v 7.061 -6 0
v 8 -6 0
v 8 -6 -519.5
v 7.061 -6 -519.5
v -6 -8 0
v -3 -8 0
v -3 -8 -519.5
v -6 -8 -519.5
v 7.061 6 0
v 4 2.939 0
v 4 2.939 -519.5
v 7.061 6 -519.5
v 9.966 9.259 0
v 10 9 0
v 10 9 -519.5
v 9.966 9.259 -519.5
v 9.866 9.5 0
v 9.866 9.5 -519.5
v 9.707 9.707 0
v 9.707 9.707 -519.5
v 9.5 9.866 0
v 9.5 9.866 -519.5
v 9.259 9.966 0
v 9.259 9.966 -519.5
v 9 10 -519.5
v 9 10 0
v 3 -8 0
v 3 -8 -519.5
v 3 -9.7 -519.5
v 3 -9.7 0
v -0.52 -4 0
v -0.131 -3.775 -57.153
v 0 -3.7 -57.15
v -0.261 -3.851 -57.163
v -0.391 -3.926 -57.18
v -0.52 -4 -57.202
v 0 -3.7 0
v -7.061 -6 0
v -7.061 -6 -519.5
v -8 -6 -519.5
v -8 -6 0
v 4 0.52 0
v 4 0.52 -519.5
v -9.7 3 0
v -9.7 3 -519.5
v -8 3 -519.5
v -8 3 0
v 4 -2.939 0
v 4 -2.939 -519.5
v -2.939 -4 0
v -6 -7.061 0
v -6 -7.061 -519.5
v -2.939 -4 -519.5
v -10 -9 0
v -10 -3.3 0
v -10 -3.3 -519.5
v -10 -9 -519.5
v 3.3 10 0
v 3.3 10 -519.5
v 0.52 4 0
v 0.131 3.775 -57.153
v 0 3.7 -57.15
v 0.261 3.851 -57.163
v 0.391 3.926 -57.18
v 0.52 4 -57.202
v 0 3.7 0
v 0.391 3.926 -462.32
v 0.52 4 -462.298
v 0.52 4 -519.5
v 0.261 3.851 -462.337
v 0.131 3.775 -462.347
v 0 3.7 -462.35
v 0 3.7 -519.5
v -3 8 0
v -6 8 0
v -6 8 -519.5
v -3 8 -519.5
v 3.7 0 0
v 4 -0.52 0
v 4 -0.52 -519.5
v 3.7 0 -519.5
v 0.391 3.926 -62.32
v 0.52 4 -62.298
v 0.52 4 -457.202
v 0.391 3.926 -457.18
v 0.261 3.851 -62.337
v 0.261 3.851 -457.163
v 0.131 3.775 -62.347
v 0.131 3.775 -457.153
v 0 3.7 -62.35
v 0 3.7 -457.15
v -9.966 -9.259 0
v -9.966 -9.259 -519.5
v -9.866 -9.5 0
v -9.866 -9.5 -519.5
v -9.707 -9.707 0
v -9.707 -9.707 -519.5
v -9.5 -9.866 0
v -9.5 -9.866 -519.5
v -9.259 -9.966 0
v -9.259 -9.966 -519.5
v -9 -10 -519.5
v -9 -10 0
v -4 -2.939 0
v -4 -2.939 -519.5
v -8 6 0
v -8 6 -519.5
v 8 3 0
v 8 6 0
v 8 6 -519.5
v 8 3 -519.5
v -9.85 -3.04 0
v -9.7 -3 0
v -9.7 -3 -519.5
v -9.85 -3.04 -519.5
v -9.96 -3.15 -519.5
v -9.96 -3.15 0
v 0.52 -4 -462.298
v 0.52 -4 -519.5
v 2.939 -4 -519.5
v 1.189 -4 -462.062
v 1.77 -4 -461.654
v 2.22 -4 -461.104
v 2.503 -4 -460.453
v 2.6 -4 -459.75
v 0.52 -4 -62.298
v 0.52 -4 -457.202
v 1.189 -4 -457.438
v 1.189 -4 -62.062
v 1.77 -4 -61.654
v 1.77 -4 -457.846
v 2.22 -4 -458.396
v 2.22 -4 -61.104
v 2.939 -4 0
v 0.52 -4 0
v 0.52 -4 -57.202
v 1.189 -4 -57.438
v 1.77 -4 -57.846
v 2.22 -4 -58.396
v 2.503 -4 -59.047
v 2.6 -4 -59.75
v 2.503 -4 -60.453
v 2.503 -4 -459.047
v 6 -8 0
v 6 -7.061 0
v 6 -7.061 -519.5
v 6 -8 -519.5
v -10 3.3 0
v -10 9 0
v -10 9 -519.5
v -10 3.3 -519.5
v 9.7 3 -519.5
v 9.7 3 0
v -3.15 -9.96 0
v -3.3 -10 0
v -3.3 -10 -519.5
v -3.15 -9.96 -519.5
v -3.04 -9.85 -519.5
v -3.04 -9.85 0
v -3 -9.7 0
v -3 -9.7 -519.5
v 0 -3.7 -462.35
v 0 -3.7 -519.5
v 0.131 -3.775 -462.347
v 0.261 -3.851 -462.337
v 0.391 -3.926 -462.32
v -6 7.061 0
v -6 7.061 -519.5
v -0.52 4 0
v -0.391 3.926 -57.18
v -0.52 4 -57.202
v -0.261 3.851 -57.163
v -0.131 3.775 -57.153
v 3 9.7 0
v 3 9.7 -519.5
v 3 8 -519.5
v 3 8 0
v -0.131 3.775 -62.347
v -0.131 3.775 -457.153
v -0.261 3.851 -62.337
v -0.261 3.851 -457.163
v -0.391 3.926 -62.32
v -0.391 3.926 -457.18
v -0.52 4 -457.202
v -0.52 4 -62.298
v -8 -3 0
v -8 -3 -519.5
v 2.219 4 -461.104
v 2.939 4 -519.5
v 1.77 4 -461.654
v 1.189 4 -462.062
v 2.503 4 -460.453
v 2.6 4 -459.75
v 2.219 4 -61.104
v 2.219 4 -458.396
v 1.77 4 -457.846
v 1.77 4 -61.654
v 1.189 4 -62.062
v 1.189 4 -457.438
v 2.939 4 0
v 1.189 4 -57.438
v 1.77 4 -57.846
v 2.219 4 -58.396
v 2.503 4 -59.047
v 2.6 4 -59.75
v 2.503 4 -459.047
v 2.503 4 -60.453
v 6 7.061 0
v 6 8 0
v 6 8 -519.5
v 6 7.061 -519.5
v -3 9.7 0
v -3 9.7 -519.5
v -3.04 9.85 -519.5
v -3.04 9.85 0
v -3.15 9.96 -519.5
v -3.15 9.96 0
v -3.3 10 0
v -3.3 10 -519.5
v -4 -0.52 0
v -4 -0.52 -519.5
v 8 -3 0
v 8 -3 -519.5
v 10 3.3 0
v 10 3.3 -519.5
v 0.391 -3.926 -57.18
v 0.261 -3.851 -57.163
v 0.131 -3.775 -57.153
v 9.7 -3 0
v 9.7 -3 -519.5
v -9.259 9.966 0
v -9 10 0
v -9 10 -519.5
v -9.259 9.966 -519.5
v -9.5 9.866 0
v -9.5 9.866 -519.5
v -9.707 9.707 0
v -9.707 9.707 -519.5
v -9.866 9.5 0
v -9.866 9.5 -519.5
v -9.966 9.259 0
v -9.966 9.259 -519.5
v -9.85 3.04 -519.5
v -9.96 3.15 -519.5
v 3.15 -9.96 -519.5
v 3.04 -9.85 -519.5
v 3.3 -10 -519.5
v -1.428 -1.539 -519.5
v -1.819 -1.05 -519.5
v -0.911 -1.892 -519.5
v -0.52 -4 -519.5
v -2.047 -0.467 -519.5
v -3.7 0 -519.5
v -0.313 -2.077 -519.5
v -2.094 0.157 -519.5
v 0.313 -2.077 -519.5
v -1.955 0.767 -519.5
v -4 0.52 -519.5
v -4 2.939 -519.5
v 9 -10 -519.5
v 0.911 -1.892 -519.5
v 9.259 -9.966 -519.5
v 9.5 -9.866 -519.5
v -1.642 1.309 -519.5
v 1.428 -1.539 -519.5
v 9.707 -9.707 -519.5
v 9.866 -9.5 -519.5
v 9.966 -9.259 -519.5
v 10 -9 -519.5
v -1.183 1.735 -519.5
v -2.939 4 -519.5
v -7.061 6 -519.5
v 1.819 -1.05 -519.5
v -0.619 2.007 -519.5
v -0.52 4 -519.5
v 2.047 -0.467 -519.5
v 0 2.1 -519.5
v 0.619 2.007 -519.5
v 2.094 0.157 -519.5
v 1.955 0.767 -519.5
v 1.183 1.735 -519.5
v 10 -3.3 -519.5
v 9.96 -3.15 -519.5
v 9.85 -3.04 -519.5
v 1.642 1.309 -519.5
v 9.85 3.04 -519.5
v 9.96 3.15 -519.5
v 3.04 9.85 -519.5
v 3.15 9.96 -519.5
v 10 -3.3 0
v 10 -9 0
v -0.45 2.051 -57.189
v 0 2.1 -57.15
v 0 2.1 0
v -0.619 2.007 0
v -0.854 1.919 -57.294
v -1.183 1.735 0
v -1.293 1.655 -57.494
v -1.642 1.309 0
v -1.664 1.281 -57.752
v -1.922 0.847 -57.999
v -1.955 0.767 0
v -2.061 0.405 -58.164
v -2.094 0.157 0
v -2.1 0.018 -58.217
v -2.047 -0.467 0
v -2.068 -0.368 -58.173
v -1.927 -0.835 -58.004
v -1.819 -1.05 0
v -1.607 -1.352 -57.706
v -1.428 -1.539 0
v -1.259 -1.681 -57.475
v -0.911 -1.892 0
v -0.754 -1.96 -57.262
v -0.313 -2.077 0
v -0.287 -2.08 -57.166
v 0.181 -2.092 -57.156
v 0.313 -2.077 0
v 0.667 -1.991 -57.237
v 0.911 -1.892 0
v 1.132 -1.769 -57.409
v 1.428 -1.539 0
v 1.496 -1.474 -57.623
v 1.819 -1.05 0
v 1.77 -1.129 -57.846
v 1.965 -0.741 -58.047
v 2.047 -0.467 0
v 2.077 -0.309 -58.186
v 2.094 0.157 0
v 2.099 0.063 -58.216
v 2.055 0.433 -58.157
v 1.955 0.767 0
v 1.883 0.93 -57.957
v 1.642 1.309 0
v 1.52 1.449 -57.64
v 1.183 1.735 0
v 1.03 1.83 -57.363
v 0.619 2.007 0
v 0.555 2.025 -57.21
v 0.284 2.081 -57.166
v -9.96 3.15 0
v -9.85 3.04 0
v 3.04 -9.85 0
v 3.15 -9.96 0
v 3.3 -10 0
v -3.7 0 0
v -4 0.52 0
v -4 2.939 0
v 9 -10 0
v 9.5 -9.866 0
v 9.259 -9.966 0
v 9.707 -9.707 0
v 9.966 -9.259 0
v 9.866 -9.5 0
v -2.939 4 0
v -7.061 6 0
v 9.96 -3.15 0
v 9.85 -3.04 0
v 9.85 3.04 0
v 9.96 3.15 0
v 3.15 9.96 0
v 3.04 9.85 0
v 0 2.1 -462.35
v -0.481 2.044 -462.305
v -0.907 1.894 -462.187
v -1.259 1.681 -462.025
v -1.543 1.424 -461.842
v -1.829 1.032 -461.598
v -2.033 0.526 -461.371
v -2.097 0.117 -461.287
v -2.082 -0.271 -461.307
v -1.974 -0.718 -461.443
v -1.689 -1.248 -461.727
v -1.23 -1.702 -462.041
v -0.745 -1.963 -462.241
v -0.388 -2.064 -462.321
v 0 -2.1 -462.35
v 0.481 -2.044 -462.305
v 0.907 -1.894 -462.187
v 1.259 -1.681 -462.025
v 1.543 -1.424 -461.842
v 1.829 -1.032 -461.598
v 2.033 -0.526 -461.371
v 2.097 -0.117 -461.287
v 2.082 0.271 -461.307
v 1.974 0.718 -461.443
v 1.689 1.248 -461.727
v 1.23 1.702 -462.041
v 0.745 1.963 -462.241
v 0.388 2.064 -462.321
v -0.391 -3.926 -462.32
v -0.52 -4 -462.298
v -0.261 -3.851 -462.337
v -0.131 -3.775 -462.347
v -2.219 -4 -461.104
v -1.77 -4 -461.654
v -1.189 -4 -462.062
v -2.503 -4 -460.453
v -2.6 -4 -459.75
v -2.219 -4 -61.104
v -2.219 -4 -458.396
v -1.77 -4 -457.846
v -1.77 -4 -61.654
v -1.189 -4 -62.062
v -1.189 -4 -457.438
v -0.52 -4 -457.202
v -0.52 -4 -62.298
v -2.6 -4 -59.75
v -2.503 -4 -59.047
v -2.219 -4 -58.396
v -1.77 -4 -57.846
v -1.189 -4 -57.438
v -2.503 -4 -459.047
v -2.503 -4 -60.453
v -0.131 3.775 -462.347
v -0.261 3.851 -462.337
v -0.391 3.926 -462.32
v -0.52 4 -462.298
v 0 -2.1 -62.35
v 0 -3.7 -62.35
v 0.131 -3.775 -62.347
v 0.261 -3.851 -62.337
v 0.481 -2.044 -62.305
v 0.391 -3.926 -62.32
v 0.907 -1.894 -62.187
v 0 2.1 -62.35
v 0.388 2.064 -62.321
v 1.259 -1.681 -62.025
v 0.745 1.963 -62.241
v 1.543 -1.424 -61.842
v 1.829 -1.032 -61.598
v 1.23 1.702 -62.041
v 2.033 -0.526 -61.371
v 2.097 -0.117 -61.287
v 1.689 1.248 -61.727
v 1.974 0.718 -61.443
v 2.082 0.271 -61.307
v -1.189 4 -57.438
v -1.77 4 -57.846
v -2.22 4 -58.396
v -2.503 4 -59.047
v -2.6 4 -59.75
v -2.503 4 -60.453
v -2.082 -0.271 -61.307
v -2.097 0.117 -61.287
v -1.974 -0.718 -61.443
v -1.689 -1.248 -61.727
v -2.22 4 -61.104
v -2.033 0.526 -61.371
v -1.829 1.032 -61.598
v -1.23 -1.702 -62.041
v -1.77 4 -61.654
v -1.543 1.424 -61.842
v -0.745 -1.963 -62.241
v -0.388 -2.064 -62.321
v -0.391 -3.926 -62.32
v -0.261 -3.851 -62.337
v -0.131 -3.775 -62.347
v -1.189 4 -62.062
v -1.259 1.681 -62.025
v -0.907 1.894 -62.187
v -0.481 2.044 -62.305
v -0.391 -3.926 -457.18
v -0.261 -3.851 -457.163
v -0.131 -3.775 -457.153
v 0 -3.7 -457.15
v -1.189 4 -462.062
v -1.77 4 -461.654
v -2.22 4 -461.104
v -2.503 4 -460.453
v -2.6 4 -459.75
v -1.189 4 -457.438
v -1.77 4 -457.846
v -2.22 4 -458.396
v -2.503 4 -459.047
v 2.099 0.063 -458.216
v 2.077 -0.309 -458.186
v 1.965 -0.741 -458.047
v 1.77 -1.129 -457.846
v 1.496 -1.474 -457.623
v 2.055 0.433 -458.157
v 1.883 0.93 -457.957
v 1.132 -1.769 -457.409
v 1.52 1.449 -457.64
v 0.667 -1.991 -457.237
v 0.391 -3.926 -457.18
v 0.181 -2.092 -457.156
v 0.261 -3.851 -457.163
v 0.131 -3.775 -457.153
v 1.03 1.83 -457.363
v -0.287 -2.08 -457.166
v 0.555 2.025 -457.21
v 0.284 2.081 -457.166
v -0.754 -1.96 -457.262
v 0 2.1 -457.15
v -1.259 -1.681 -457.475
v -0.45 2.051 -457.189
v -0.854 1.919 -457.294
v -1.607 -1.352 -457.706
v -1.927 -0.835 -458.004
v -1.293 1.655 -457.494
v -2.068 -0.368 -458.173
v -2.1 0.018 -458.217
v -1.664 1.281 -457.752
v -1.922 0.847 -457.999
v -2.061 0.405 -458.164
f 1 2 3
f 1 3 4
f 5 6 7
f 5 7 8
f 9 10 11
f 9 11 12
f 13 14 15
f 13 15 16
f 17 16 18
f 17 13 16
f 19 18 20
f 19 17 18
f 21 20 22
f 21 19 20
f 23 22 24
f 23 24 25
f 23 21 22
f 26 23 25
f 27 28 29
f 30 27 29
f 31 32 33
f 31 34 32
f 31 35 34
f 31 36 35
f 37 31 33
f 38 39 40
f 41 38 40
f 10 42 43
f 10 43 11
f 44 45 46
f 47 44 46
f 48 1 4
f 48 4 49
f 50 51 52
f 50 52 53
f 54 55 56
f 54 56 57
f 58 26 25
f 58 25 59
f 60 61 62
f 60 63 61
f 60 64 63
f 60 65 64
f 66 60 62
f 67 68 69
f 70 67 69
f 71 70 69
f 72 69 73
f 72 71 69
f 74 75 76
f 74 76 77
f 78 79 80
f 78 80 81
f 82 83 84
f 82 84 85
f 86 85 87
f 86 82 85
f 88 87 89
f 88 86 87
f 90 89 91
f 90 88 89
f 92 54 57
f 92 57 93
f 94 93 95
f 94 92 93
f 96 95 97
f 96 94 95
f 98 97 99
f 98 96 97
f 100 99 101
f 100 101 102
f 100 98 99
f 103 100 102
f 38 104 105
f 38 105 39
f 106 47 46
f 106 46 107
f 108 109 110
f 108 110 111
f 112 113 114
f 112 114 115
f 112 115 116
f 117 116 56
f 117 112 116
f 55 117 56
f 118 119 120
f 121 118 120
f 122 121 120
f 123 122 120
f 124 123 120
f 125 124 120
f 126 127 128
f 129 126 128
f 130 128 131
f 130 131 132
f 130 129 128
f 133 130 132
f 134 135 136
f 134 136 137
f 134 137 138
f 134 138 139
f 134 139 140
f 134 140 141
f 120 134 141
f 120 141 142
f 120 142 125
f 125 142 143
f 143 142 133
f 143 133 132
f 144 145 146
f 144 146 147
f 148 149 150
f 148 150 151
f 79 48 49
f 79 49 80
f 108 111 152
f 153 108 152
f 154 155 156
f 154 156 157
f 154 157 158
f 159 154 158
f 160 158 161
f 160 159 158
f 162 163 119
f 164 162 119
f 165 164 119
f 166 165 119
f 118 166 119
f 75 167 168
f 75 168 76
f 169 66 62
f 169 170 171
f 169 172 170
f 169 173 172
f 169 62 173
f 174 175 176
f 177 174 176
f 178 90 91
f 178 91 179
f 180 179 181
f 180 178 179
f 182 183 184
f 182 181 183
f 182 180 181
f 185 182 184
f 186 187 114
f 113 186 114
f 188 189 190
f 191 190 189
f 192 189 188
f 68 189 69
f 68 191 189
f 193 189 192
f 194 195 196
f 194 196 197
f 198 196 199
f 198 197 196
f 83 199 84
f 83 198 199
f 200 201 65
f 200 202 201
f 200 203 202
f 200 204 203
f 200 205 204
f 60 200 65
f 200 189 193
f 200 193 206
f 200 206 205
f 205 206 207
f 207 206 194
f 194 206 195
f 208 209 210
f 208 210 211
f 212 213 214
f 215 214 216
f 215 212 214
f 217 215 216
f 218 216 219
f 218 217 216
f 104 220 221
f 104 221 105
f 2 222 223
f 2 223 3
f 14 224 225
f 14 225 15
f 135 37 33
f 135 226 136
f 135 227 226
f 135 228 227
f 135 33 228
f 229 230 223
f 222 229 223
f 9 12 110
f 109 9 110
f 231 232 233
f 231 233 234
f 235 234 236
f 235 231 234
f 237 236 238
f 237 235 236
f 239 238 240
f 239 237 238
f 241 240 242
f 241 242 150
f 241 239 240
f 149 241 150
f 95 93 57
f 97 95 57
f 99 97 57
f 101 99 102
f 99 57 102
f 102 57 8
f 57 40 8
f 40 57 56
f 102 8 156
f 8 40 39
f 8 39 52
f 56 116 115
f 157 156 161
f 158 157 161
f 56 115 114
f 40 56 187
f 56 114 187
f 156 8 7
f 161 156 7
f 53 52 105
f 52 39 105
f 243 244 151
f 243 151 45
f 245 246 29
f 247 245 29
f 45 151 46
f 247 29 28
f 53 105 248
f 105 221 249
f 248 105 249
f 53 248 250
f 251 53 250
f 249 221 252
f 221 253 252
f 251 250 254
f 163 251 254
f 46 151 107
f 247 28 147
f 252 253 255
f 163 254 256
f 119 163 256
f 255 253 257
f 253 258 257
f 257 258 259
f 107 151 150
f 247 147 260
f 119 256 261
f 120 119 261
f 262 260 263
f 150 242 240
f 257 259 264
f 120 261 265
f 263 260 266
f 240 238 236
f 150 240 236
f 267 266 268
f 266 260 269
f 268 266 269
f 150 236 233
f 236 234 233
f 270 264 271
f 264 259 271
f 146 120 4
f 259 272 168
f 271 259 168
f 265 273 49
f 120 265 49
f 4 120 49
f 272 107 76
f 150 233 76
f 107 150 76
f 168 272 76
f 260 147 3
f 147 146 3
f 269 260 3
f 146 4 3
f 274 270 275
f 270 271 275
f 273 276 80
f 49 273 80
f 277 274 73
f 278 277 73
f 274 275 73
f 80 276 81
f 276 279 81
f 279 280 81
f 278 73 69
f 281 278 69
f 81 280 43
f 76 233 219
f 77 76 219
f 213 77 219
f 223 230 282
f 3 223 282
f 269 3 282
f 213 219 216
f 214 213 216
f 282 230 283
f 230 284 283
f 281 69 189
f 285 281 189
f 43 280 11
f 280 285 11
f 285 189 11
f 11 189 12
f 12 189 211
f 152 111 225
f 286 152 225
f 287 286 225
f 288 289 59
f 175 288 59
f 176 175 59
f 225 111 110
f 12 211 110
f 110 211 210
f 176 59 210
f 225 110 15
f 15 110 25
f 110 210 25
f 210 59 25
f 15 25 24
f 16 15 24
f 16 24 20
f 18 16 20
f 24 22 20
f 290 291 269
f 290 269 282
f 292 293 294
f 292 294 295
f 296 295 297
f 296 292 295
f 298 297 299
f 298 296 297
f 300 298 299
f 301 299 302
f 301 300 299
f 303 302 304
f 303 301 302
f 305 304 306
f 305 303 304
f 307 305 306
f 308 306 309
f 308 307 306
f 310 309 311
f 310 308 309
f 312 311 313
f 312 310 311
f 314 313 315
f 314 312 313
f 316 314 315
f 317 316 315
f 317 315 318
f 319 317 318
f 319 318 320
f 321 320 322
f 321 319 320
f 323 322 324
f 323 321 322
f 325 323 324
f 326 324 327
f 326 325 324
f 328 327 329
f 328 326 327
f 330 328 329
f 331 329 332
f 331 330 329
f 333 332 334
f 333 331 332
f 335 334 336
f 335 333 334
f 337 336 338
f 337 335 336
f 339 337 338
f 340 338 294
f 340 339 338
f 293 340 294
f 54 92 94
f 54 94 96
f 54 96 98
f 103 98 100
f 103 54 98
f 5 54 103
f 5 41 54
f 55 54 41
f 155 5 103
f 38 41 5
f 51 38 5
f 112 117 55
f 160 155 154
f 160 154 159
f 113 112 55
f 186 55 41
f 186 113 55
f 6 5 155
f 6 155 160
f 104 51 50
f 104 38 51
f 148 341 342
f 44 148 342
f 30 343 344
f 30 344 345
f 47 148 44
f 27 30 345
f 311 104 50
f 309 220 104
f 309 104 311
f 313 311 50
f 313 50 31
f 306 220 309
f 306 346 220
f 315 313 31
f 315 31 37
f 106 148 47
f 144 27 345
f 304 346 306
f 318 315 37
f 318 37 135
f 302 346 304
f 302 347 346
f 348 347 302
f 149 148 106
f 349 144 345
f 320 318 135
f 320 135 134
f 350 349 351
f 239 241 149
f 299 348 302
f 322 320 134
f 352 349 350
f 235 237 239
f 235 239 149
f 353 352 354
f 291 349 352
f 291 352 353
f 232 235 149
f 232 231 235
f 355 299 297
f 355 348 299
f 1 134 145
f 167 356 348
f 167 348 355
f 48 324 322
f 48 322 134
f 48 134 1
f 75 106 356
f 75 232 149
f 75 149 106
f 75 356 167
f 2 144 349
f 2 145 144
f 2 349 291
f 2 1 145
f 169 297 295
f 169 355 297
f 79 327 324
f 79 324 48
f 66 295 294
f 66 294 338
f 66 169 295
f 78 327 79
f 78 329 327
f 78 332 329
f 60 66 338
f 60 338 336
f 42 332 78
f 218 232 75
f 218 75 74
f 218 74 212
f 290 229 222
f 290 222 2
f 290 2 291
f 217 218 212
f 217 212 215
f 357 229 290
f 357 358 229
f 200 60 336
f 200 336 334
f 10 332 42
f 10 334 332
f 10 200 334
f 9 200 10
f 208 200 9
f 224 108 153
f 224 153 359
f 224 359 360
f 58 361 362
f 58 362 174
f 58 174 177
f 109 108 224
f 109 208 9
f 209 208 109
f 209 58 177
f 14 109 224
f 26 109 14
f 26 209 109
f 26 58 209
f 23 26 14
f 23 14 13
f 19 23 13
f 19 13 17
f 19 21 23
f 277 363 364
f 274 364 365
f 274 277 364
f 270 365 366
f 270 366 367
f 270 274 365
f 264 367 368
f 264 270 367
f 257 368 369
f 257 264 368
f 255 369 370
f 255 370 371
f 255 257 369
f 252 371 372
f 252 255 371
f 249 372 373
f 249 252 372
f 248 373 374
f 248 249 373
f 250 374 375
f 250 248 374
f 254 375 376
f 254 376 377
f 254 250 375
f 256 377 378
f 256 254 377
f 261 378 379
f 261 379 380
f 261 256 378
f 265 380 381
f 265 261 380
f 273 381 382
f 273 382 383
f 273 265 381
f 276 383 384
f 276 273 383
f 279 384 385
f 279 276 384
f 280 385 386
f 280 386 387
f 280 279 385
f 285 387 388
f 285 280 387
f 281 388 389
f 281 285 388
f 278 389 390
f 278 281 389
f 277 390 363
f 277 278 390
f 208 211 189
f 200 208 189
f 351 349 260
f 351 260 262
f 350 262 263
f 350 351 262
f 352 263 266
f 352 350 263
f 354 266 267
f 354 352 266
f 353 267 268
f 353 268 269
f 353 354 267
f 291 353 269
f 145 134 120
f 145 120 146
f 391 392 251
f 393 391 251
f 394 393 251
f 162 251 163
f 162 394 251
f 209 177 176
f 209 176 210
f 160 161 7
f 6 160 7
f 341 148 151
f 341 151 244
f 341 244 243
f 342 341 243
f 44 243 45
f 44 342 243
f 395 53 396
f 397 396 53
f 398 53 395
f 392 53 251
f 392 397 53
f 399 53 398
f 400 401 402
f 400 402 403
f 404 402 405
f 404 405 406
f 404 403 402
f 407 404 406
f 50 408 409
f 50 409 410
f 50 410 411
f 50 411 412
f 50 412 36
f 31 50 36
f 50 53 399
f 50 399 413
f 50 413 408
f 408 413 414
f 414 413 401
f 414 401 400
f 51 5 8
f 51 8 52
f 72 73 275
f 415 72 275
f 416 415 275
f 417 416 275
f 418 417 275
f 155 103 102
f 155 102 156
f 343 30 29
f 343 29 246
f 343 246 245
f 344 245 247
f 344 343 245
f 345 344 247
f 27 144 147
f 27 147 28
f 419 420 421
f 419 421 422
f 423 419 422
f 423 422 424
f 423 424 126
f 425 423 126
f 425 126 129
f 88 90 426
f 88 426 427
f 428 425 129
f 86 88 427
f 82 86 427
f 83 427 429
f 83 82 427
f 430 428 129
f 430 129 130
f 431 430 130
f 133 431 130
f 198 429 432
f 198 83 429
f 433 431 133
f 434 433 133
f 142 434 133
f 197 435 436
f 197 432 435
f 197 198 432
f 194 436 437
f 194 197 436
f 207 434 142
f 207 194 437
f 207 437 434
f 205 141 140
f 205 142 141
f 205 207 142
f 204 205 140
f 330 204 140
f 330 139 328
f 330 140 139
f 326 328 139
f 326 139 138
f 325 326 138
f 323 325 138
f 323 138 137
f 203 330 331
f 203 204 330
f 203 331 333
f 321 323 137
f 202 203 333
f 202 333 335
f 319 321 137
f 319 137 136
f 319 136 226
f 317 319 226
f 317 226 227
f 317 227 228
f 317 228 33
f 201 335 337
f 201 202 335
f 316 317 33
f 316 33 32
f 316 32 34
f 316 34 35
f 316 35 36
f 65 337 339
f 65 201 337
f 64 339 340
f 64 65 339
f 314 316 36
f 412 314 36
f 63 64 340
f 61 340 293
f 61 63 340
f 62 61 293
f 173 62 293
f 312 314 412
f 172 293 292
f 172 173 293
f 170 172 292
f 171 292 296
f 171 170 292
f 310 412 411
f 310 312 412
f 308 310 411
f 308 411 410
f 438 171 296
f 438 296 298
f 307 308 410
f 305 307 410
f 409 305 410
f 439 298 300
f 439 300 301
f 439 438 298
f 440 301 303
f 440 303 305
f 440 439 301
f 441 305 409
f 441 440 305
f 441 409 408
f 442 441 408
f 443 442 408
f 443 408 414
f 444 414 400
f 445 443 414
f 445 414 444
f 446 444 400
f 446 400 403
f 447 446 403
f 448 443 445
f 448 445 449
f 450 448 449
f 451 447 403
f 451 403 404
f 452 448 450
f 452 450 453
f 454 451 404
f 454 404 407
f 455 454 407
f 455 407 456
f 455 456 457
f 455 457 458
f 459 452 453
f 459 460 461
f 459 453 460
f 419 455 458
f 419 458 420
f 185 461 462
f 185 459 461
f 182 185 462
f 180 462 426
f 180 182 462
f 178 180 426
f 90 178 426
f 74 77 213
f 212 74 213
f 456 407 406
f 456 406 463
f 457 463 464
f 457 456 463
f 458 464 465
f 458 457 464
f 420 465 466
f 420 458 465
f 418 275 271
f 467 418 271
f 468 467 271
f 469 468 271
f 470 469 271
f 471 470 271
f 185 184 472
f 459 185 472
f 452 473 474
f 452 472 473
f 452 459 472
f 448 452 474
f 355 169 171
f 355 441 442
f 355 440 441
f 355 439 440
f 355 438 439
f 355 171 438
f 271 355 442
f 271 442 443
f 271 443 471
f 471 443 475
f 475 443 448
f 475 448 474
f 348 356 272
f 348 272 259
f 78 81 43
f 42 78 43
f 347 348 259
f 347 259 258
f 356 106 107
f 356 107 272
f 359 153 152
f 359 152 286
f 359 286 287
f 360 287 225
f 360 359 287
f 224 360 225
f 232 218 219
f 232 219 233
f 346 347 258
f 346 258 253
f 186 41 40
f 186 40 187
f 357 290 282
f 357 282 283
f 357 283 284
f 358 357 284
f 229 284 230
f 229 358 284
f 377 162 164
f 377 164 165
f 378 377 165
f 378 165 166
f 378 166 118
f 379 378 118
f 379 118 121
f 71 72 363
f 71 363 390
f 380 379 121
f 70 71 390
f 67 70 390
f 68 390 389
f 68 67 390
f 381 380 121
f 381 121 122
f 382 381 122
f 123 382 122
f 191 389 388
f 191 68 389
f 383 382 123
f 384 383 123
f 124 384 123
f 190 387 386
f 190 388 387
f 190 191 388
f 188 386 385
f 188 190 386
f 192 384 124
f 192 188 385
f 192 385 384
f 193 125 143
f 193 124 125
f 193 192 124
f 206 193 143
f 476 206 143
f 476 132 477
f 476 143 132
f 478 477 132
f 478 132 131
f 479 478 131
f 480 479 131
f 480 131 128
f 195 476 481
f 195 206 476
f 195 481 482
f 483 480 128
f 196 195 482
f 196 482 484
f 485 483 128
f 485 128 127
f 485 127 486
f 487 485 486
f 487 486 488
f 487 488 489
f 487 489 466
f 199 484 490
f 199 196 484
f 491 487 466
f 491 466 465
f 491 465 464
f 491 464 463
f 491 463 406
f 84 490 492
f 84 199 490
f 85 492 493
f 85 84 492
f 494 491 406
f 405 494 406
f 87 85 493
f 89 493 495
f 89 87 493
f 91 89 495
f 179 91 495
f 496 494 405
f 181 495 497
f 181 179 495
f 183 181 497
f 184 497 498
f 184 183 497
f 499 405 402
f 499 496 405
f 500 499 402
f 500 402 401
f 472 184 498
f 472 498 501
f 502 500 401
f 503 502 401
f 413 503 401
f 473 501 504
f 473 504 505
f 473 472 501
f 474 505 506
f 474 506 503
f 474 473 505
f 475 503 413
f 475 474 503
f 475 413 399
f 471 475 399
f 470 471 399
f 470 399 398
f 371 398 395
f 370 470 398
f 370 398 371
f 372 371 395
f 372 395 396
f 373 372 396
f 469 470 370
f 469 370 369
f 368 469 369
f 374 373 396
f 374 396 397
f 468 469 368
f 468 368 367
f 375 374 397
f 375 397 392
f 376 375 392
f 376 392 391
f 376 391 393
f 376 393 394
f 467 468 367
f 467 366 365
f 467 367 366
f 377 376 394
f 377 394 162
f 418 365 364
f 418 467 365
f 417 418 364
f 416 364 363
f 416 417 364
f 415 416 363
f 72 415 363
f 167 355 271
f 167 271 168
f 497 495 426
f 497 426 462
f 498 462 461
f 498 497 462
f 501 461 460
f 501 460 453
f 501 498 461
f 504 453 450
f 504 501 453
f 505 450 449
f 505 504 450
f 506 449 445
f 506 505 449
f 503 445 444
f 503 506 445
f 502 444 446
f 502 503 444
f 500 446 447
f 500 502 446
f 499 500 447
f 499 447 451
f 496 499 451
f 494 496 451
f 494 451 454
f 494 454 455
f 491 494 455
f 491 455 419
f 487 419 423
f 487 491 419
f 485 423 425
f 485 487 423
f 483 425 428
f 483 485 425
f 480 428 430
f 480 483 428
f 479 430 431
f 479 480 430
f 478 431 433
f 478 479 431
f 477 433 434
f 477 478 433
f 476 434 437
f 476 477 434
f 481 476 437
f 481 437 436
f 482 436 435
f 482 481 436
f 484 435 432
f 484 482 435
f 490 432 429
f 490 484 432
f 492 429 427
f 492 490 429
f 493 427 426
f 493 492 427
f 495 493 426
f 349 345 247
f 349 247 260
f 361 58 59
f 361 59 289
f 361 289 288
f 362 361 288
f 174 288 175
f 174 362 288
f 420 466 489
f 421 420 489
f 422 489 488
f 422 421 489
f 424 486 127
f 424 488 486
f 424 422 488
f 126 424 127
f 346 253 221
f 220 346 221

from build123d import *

# Parameters (mm, degrees)
BOSS_EXTRUDE1_DEPTH = 519.5
SKETCH2_W           = 519.5
SKETCH2_H           = 2.1
SKETCH4_R           = 2.6
CUT_EXTRUDE2_DEPTH  = 20


with BuildPart() as part:
    # Sketch1 → Boss-Extrude1 (new body)
    with BuildSketch(Plane.XY):
        with BuildLine():
            Line((-10, 9), (-10, 3.29999995))
            ThreePointArc((-10, 3.29999995), (-9.912132049, 3.087867916), (-9.7, 3))
            Line((-9.7, 3), (-8, 3))
            Line((-8, 3), (-8, 6))
            Line((-8, 6), (-7.060677, 6))
            Line((-7.060677, 6), (-4, 2.93932965))
            Line((-4, 2.93932965), (-4, 0.519615242))
            Line((-4, 0.519615242), (-3.699996283, -6.437e-06))
            Line((-3.699996283, -6.437e-06), (-4, -0.519628117))
            Line((-4, -0.519628117), (-4, -2.93933725))
            Line((-4, -2.93933725), (-7.0606695, -6))
            Line((-7.0606695, -6), (-8, -6))
            Line((-8, -6), (-8, -3))
            Line((-8, -3), (-9.7, -3))
            ThreePointArc((-9.7, -3), (-9.912132049, -3.087867916), (-10, -3.29999995))
            Line((-10, -3.29999995), (-10, -9))
            ThreePointArc((-10, -9), (-9.707106781, -9.707106781), (-9, -10))
            Line((-9, -10), (-3.29999995, -10))
            ThreePointArc((-3.29999995, -10), (-3.087867916, -9.912132049), (-3, -9.7))
            Line((-3, -9.7), (-3, -8))
            Line((-3, -8), (-6, -8))
            Line((-6, -8), (-6, -7.0606515))
            Line((-6, -7.0606515), (-2.9393489, -4))
            Line((-2.9393489, -4), (-0.519615242, -4))
            Line((-0.519615242, -4), (6.437e-06, -3.699996283))
            Line((6.437e-06, -3.699996283), (0.519628117, -4))
            Line((0.519628117, -4), (2.9393227, -4))
            Line((2.9393227, -4), (6, -7.060677))
            Line((6, -7.060677), (6, -8))
            Line((6, -8), (3, -8))
            Line((3, -8), (3, -9.7))
            ThreePointArc((3, -9.7), (3.087867916, -9.912132049), (3.29999995, -10))
            Line((3.29999995, -10), (9, -10))
            ThreePointArc((9, -10), (9.707106781, -9.707106781), (10, -9))
            Line((10, -9), (10, -3.29999995))
            ThreePointArc((10, -3.29999995), (9.912132049, -3.087867916), (9.7, -3))
            Line((9.7, -3), (8, -3))
            Line((8, -3), (8, -6))
            Line((8, -6), (7.0606435, -6))
            Line((7.0606435, -6), (4, -2.9393482))
            Line((4, -2.9393482), (4, -0.519615242))
            Line((4, -0.519615242), (3.699996283, 6.437e-06))
            Line((3.699996283, 6.437e-06), (4, 0.519628117))
            Line((4, 0.519628117), (4, 2.9393401))
            Line((4, 2.9393401), (7.060651, 6))
            Line((7.060651, 6), (8, 6))
            Line((8, 6), (8, 3))
            Line((8, 3), (9.7, 3))
            ThreePointArc((9.7, 3), (9.912132049, 3.087867916), (10, 3.29999995))
            Line((10, 3.29999995), (10, 9))
            ThreePointArc((10, 9), (9.707106781, 9.707106781), (9, 10))
            Line((9, 10), (3.29999995, 10))
            ThreePointArc((3.29999995, 10), (3.087867916, 9.912132049), (3, 9.7))
            Line((3, 9.7), (3, 8))
            Line((3, 8), (6, 8))
            Line((6, 8), (6, 7.060669))
            Line((6, 7.060669), (2.9393308, 4))
            Line((2.9393308, 4), (0.519615242, 4))
            Line((0.519615242, 4), (-6.437e-06, 3.699996283))
            Line((-6.437e-06, 3.699996283), (-0.519628117, 4))
            Line((-0.519628117, 4), (-2.93935655, 4))
            Line((-2.93935655, 4), (-6, 7.0606435))
            Line((-6, 7.0606435), (-6, 8))
            Line((-6, 8), (-3, 8))
            Line((-3, 8), (-3, 9.7))
            ThreePointArc((-3, 9.7), (-3.087867966, 9.912132034), (-3.3, 10))
            Line((-3.3, 10), (-9, 10))
            ThreePointArc((-9, 10), (-9.707106781, 9.707106781), (-10, 9))
        make_face()
    extrude(amount=-BOSS_EXTRUDE1_DEPTH)

    # Sketch2 → Cut-Revolve1 (revolve, cut)
    with BuildSketch(Plane(origin=(0, 0, 0), x_dir=(0, 0, -1), z_dir=(1, 0, 0))):
        with Locations((259.75, 1.05)):
            Rectangle(SKETCH2_W, SKETCH2_H)
    revolve(axis=Axis((0, 0, -519.5), (0, 0, 1)), mode=Mode.SUBTRACT)

    # Sketch4 → Cut-Extrude2 (cut)
    with BuildSketch(Plane(origin=(0, 10, 0), x_dir=(0, 0, -1), z_dir=(0, -1, 0))):
        with Locations((459.75, 0)):
            Circle(SKETCH4_R)
        with Locations((59.75, 0)):
            Circle(SKETCH4_R)
    extrude(amount=CUT_EXTRUDE2_DEPTH, mode=Mode.SUBTRACT)


solid = part.part
